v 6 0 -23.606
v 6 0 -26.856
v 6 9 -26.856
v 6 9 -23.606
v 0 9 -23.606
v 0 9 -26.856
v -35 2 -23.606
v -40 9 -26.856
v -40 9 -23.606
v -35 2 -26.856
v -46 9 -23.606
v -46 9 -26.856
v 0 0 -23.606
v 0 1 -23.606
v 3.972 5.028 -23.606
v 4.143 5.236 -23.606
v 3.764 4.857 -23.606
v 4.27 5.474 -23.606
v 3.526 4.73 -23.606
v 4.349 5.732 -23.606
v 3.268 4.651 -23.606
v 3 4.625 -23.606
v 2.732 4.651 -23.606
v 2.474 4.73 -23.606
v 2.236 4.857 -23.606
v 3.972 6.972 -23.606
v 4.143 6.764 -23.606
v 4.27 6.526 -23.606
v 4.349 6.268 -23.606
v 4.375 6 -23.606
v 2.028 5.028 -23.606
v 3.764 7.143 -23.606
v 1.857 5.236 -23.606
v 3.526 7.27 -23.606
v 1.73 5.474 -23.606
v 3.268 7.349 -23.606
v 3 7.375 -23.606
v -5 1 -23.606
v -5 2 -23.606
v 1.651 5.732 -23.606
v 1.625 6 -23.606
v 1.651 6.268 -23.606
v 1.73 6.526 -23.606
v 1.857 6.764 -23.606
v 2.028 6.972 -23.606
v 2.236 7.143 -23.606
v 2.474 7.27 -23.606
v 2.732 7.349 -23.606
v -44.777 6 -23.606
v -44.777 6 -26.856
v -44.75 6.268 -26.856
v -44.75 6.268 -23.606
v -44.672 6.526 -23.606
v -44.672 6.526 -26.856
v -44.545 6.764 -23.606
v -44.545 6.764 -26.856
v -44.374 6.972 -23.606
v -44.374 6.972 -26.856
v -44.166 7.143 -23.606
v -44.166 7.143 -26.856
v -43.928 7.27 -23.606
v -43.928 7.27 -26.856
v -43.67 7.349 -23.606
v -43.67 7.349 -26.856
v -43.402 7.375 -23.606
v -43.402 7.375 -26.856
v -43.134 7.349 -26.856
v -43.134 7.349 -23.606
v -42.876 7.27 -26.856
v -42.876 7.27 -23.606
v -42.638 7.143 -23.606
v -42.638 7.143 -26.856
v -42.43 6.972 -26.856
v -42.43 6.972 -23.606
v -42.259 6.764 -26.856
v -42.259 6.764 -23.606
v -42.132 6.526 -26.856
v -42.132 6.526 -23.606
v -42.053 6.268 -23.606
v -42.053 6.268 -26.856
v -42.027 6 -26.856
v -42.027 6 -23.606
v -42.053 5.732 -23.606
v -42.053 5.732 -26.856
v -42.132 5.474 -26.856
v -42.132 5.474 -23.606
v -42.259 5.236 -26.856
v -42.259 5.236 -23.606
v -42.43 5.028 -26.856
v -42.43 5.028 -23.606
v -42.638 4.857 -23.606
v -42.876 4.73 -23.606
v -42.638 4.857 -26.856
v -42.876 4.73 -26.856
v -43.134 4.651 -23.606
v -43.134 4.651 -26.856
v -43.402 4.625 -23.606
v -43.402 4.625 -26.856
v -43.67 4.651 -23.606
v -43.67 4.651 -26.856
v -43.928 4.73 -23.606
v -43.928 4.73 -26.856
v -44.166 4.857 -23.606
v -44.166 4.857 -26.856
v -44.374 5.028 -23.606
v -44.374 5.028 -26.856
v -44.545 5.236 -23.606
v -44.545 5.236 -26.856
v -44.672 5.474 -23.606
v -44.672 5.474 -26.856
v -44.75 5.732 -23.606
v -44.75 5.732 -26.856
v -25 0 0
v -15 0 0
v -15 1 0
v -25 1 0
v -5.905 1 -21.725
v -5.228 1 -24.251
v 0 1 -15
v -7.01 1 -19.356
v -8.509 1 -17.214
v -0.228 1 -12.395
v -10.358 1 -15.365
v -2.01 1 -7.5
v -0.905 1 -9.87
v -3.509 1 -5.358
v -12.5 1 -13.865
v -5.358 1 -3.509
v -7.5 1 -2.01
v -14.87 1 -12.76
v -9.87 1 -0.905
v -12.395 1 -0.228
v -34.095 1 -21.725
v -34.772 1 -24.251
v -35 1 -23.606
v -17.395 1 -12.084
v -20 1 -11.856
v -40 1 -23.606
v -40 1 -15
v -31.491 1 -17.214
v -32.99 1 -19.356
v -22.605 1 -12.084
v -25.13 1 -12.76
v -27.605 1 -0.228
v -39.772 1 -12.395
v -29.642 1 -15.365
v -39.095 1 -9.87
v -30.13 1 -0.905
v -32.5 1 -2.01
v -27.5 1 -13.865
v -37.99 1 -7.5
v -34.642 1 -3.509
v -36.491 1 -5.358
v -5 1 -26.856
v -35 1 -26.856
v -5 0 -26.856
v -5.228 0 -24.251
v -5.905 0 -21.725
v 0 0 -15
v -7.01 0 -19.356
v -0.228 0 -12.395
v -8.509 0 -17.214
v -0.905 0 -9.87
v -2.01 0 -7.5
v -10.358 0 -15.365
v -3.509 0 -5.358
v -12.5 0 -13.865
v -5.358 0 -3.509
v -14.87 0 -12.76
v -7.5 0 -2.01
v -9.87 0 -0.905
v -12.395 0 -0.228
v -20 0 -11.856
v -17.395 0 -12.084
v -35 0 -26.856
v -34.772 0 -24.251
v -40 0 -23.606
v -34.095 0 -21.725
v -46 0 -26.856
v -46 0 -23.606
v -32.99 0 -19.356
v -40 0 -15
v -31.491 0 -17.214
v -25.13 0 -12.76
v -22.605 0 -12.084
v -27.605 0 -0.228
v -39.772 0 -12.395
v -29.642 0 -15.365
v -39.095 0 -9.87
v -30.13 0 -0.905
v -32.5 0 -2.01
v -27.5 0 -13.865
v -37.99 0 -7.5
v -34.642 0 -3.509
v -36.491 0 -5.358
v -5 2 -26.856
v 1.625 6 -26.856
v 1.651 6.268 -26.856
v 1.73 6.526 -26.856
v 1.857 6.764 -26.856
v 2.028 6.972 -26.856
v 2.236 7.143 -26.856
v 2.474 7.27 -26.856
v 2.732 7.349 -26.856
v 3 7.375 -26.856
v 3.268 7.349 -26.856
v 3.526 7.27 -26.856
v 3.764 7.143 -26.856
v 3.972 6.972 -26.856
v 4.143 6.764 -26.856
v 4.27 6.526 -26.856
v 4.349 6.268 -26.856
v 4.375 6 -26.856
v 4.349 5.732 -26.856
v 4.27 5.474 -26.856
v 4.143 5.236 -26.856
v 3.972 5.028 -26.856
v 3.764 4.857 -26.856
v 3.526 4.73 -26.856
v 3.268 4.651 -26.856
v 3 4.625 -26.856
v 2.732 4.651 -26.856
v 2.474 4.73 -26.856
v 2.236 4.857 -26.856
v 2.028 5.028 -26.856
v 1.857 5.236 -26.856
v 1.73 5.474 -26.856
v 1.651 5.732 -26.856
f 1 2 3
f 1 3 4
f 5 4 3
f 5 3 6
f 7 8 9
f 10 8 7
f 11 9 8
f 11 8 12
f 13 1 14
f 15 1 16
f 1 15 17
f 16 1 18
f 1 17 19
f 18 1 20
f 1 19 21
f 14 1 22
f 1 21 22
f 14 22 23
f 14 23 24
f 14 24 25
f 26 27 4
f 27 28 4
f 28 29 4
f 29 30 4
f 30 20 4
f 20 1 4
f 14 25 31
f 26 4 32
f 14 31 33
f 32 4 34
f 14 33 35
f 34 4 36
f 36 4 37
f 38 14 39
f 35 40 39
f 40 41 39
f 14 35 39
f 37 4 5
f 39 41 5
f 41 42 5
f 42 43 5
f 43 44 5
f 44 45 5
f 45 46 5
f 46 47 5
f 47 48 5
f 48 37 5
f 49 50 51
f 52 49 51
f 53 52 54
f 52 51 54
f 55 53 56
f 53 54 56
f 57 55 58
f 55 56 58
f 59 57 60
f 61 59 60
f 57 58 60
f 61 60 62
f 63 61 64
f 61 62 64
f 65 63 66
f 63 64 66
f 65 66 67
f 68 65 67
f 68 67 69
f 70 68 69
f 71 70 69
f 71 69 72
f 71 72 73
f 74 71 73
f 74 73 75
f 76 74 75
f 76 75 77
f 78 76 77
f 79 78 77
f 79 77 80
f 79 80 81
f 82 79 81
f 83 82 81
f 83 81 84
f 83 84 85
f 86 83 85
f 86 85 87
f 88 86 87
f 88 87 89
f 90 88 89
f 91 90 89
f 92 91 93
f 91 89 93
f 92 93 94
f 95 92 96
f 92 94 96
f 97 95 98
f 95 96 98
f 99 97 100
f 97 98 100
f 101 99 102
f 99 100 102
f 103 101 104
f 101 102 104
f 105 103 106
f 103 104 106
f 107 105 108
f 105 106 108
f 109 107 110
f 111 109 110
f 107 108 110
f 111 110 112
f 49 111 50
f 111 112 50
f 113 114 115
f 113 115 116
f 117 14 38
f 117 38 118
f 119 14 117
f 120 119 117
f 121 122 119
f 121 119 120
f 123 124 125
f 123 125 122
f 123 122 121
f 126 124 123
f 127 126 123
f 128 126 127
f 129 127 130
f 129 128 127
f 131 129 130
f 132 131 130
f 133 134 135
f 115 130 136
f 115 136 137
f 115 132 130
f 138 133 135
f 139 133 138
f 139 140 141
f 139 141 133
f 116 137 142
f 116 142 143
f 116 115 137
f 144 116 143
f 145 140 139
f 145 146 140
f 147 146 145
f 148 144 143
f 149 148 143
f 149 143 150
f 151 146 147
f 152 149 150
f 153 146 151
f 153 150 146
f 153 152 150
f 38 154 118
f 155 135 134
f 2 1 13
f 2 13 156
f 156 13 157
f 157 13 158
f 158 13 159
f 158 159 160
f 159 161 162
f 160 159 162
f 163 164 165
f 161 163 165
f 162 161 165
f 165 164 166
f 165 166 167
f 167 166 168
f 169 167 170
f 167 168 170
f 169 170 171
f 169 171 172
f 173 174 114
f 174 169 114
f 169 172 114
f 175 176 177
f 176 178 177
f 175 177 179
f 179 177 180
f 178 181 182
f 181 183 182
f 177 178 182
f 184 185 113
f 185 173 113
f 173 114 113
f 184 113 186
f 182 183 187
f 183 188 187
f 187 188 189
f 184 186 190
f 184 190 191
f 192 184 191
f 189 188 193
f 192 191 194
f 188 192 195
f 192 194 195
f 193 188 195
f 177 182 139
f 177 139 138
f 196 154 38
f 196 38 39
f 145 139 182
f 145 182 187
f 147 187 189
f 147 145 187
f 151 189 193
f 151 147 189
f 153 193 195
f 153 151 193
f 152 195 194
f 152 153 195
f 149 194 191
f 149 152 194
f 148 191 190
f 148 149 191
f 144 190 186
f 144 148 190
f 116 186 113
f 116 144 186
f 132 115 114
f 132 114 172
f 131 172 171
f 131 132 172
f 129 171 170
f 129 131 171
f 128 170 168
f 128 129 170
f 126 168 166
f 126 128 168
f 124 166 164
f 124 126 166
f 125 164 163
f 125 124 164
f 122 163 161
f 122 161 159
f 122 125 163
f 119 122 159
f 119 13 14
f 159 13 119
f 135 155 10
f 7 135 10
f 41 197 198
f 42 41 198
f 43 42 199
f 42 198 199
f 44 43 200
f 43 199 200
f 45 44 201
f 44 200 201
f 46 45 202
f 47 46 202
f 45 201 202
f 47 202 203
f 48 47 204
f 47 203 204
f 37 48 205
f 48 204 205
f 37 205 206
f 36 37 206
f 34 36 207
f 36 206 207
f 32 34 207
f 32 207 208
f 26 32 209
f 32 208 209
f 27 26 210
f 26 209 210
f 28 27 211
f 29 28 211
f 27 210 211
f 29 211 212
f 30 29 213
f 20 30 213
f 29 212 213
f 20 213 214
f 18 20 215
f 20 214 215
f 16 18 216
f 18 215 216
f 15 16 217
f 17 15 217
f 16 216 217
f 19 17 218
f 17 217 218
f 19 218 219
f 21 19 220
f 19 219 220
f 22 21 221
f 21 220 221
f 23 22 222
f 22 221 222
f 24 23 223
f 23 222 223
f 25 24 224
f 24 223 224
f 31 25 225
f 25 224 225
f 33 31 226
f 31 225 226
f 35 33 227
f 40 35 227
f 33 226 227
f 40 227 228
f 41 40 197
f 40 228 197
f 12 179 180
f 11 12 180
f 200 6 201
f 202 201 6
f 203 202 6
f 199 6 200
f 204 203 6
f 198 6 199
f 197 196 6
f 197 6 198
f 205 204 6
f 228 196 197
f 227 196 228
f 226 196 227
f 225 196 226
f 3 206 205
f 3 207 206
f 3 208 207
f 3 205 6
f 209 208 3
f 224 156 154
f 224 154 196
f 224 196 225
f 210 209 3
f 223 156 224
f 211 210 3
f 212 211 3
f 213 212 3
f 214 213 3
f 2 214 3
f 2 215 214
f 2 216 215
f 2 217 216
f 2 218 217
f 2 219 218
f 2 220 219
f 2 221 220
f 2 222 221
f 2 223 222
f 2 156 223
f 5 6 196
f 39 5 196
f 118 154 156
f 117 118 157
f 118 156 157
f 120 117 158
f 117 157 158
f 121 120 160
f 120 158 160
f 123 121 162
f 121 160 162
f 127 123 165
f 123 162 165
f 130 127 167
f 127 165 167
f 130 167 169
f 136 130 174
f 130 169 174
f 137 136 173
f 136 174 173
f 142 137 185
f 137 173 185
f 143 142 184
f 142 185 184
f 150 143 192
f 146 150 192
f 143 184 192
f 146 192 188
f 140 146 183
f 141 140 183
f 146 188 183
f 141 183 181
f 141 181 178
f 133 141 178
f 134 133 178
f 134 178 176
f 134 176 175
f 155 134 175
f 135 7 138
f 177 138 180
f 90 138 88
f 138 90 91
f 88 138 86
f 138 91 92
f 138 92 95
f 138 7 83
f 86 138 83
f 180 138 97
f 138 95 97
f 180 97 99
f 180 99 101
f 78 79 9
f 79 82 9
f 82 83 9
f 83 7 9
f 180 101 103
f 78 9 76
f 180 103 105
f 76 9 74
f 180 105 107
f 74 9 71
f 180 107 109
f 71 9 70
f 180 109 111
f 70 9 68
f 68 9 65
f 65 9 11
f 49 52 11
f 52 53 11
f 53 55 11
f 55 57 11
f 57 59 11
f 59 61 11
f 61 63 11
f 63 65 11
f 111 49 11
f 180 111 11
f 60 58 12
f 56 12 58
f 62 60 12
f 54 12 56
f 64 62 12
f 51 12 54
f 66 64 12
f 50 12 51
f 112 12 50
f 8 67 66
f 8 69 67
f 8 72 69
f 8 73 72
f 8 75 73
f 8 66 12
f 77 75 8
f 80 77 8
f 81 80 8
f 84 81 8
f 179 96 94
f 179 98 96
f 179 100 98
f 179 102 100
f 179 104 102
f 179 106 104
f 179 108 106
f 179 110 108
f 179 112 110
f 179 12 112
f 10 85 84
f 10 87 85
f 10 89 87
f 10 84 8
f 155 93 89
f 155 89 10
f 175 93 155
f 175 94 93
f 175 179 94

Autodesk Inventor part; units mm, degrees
ref_plane "YZ Plane" through (0, 0, 0) normal (1, 0, 0) x (0, 1, 0)
ref_plane "XZ Plane" through (0, 0, 0) normal (0, 1, 0) x (-1, 0, 0)
ref_plane "XY Plane" through (0, 0, 0) normal (0, 0, 1) x (1, 0, 0)
sketch "スケッチ1" plane through (0, 0, 0) normal (0, 1, 0) x (-1, 0, 0)
  line L0 (0, 0) -> (40, 0)
  line L1 (40, 0) -> (40, -26.8558)
  line L2 (40, -26.8558) -> (0, -26.8558)
  line L3 (0, -26.8558) -> (0, 0)
  circle A0 centre (20, -26.8558) radius 15
  line L4 (20, -26.8558) -> (20, 0)
  line L5 (40, -23.6058) -> (40, -26.8558)
  line L6 (0, -23.6058) -> (0, -26.8558)
  circle A1 centre (20, -26.8558) radius 17
  line L7 (40, -26.8558) -> (46, -26.8558)
  line L8 (46, -26.8558) -> (46, -23.6058)
  line L9 (46, -23.6058) -> (40, -23.6058)
  line L10 (40, -23.6058) -> (40, -26.8558)
  line L11 (0, -23.6058) -> (0, -26.8558)
  line L12 (0, -26.8558) -> (-6, -26.8558)
  line L13 (-6, -26.8558) -> (-6, -23.6058)
  line L14 (-6, -23.6058) -> (0, -23.6058)
  line L15 (0, -23.6058) -> (0, -26.8558)
  point P0 (35, -26.8558)
  point P1 (5, -26.8558)
  dimension "d0" = 40
  dimension "d1" = 30
  dimension "d16" = 34
  dimension "d18" = 6
  dimension "d19" = 3.25
extrude "押し出し1" add sketch "スケッチ1" along normal blind 1 contours L0 L4 A1 L2 L3 | L0 L1 L2 A1 L4 | A1 L2 A0 L4 | L4 A0 L2 A1 | L4 L2 A0 | A0 L2 L4
fillet "フィレット1" radius 15 2 edges at (-40, 0.5, 0) (0, 0.5, 0)
extrude "押し出し4" add sketch "スケッチ1" along normal blind 9 contours L3 L12 L13 L14 | L9 L8 L7 L1
sketch "スケッチ7" plane through (6, 0, -26.8558) normal (0, 0, -1) x (-1, 0, 0)
  circle A0 centre (3, 6) radius 1.375
  line L0 (6, 1) -> (6, 9) projected
  line L1 (0, 9) -> (6, 9) projected
  circle A1 centre (49.4019, 6) radius 1.375
  line L2 (46, 9) -> (52, 9) projected
  line L3 (52, 0) -> (52, 9) projected
  point P0 (6, 0)
  point P1 (3, 9)
  point P2 (52, 4.5)
  dimension "d22" = 2.75
  dimension "d23" = 3
  dimension "d24" = 3
  dimension "d25" = 2.75
  dimension "d26" = 3
  dimension "d27" = 3
extrude "押し出し5" cut sketch "スケッチ7" against normal blind 6
extrude "押し出し6" cut sketch "スケッチ1" along normal blind 1 contours L4 L2 A0 | A0 L2 L4
sketch "スケッチ9" plane through (6, 9, -26.8558) normal (0, 0, -1) x (-1, 0, 0)
  line L0 (6, -8) -> (6, 0) projected
  line L1 (6, -8) -> (11, -8)
  line L2 (11, -8) -> (11, -7)
  line L3 (11, -7) -> (6, -7)
  line L4 (6, -7) -> (6, -8)
  line L5 (6, 0) -> (11, -7)
  line L6 (41, -8) -> (41, -9) projected
  line L7 (52, 0) -> (46, 0) projected
  line L8 (46, -8) -> (46, 0) projected
  line L9 (46, -8) -> (41, -8)
  line L10 (41, -8) -> (41, -7)
  line L11 (41, -7) -> (46, -7)
  line L12 (46, -7) -> (46, -8)
  line L13 (46, 0) -> (41, -7)
  point P0 (6, -9)
  dimension "d32" = 5
  dimension "d33" = 1
  dimension "d38" = 5
extrude "押し出し7" add sketch "スケッチ9" against normal blind 3.25
properties part number "PartsForRaspibase"
